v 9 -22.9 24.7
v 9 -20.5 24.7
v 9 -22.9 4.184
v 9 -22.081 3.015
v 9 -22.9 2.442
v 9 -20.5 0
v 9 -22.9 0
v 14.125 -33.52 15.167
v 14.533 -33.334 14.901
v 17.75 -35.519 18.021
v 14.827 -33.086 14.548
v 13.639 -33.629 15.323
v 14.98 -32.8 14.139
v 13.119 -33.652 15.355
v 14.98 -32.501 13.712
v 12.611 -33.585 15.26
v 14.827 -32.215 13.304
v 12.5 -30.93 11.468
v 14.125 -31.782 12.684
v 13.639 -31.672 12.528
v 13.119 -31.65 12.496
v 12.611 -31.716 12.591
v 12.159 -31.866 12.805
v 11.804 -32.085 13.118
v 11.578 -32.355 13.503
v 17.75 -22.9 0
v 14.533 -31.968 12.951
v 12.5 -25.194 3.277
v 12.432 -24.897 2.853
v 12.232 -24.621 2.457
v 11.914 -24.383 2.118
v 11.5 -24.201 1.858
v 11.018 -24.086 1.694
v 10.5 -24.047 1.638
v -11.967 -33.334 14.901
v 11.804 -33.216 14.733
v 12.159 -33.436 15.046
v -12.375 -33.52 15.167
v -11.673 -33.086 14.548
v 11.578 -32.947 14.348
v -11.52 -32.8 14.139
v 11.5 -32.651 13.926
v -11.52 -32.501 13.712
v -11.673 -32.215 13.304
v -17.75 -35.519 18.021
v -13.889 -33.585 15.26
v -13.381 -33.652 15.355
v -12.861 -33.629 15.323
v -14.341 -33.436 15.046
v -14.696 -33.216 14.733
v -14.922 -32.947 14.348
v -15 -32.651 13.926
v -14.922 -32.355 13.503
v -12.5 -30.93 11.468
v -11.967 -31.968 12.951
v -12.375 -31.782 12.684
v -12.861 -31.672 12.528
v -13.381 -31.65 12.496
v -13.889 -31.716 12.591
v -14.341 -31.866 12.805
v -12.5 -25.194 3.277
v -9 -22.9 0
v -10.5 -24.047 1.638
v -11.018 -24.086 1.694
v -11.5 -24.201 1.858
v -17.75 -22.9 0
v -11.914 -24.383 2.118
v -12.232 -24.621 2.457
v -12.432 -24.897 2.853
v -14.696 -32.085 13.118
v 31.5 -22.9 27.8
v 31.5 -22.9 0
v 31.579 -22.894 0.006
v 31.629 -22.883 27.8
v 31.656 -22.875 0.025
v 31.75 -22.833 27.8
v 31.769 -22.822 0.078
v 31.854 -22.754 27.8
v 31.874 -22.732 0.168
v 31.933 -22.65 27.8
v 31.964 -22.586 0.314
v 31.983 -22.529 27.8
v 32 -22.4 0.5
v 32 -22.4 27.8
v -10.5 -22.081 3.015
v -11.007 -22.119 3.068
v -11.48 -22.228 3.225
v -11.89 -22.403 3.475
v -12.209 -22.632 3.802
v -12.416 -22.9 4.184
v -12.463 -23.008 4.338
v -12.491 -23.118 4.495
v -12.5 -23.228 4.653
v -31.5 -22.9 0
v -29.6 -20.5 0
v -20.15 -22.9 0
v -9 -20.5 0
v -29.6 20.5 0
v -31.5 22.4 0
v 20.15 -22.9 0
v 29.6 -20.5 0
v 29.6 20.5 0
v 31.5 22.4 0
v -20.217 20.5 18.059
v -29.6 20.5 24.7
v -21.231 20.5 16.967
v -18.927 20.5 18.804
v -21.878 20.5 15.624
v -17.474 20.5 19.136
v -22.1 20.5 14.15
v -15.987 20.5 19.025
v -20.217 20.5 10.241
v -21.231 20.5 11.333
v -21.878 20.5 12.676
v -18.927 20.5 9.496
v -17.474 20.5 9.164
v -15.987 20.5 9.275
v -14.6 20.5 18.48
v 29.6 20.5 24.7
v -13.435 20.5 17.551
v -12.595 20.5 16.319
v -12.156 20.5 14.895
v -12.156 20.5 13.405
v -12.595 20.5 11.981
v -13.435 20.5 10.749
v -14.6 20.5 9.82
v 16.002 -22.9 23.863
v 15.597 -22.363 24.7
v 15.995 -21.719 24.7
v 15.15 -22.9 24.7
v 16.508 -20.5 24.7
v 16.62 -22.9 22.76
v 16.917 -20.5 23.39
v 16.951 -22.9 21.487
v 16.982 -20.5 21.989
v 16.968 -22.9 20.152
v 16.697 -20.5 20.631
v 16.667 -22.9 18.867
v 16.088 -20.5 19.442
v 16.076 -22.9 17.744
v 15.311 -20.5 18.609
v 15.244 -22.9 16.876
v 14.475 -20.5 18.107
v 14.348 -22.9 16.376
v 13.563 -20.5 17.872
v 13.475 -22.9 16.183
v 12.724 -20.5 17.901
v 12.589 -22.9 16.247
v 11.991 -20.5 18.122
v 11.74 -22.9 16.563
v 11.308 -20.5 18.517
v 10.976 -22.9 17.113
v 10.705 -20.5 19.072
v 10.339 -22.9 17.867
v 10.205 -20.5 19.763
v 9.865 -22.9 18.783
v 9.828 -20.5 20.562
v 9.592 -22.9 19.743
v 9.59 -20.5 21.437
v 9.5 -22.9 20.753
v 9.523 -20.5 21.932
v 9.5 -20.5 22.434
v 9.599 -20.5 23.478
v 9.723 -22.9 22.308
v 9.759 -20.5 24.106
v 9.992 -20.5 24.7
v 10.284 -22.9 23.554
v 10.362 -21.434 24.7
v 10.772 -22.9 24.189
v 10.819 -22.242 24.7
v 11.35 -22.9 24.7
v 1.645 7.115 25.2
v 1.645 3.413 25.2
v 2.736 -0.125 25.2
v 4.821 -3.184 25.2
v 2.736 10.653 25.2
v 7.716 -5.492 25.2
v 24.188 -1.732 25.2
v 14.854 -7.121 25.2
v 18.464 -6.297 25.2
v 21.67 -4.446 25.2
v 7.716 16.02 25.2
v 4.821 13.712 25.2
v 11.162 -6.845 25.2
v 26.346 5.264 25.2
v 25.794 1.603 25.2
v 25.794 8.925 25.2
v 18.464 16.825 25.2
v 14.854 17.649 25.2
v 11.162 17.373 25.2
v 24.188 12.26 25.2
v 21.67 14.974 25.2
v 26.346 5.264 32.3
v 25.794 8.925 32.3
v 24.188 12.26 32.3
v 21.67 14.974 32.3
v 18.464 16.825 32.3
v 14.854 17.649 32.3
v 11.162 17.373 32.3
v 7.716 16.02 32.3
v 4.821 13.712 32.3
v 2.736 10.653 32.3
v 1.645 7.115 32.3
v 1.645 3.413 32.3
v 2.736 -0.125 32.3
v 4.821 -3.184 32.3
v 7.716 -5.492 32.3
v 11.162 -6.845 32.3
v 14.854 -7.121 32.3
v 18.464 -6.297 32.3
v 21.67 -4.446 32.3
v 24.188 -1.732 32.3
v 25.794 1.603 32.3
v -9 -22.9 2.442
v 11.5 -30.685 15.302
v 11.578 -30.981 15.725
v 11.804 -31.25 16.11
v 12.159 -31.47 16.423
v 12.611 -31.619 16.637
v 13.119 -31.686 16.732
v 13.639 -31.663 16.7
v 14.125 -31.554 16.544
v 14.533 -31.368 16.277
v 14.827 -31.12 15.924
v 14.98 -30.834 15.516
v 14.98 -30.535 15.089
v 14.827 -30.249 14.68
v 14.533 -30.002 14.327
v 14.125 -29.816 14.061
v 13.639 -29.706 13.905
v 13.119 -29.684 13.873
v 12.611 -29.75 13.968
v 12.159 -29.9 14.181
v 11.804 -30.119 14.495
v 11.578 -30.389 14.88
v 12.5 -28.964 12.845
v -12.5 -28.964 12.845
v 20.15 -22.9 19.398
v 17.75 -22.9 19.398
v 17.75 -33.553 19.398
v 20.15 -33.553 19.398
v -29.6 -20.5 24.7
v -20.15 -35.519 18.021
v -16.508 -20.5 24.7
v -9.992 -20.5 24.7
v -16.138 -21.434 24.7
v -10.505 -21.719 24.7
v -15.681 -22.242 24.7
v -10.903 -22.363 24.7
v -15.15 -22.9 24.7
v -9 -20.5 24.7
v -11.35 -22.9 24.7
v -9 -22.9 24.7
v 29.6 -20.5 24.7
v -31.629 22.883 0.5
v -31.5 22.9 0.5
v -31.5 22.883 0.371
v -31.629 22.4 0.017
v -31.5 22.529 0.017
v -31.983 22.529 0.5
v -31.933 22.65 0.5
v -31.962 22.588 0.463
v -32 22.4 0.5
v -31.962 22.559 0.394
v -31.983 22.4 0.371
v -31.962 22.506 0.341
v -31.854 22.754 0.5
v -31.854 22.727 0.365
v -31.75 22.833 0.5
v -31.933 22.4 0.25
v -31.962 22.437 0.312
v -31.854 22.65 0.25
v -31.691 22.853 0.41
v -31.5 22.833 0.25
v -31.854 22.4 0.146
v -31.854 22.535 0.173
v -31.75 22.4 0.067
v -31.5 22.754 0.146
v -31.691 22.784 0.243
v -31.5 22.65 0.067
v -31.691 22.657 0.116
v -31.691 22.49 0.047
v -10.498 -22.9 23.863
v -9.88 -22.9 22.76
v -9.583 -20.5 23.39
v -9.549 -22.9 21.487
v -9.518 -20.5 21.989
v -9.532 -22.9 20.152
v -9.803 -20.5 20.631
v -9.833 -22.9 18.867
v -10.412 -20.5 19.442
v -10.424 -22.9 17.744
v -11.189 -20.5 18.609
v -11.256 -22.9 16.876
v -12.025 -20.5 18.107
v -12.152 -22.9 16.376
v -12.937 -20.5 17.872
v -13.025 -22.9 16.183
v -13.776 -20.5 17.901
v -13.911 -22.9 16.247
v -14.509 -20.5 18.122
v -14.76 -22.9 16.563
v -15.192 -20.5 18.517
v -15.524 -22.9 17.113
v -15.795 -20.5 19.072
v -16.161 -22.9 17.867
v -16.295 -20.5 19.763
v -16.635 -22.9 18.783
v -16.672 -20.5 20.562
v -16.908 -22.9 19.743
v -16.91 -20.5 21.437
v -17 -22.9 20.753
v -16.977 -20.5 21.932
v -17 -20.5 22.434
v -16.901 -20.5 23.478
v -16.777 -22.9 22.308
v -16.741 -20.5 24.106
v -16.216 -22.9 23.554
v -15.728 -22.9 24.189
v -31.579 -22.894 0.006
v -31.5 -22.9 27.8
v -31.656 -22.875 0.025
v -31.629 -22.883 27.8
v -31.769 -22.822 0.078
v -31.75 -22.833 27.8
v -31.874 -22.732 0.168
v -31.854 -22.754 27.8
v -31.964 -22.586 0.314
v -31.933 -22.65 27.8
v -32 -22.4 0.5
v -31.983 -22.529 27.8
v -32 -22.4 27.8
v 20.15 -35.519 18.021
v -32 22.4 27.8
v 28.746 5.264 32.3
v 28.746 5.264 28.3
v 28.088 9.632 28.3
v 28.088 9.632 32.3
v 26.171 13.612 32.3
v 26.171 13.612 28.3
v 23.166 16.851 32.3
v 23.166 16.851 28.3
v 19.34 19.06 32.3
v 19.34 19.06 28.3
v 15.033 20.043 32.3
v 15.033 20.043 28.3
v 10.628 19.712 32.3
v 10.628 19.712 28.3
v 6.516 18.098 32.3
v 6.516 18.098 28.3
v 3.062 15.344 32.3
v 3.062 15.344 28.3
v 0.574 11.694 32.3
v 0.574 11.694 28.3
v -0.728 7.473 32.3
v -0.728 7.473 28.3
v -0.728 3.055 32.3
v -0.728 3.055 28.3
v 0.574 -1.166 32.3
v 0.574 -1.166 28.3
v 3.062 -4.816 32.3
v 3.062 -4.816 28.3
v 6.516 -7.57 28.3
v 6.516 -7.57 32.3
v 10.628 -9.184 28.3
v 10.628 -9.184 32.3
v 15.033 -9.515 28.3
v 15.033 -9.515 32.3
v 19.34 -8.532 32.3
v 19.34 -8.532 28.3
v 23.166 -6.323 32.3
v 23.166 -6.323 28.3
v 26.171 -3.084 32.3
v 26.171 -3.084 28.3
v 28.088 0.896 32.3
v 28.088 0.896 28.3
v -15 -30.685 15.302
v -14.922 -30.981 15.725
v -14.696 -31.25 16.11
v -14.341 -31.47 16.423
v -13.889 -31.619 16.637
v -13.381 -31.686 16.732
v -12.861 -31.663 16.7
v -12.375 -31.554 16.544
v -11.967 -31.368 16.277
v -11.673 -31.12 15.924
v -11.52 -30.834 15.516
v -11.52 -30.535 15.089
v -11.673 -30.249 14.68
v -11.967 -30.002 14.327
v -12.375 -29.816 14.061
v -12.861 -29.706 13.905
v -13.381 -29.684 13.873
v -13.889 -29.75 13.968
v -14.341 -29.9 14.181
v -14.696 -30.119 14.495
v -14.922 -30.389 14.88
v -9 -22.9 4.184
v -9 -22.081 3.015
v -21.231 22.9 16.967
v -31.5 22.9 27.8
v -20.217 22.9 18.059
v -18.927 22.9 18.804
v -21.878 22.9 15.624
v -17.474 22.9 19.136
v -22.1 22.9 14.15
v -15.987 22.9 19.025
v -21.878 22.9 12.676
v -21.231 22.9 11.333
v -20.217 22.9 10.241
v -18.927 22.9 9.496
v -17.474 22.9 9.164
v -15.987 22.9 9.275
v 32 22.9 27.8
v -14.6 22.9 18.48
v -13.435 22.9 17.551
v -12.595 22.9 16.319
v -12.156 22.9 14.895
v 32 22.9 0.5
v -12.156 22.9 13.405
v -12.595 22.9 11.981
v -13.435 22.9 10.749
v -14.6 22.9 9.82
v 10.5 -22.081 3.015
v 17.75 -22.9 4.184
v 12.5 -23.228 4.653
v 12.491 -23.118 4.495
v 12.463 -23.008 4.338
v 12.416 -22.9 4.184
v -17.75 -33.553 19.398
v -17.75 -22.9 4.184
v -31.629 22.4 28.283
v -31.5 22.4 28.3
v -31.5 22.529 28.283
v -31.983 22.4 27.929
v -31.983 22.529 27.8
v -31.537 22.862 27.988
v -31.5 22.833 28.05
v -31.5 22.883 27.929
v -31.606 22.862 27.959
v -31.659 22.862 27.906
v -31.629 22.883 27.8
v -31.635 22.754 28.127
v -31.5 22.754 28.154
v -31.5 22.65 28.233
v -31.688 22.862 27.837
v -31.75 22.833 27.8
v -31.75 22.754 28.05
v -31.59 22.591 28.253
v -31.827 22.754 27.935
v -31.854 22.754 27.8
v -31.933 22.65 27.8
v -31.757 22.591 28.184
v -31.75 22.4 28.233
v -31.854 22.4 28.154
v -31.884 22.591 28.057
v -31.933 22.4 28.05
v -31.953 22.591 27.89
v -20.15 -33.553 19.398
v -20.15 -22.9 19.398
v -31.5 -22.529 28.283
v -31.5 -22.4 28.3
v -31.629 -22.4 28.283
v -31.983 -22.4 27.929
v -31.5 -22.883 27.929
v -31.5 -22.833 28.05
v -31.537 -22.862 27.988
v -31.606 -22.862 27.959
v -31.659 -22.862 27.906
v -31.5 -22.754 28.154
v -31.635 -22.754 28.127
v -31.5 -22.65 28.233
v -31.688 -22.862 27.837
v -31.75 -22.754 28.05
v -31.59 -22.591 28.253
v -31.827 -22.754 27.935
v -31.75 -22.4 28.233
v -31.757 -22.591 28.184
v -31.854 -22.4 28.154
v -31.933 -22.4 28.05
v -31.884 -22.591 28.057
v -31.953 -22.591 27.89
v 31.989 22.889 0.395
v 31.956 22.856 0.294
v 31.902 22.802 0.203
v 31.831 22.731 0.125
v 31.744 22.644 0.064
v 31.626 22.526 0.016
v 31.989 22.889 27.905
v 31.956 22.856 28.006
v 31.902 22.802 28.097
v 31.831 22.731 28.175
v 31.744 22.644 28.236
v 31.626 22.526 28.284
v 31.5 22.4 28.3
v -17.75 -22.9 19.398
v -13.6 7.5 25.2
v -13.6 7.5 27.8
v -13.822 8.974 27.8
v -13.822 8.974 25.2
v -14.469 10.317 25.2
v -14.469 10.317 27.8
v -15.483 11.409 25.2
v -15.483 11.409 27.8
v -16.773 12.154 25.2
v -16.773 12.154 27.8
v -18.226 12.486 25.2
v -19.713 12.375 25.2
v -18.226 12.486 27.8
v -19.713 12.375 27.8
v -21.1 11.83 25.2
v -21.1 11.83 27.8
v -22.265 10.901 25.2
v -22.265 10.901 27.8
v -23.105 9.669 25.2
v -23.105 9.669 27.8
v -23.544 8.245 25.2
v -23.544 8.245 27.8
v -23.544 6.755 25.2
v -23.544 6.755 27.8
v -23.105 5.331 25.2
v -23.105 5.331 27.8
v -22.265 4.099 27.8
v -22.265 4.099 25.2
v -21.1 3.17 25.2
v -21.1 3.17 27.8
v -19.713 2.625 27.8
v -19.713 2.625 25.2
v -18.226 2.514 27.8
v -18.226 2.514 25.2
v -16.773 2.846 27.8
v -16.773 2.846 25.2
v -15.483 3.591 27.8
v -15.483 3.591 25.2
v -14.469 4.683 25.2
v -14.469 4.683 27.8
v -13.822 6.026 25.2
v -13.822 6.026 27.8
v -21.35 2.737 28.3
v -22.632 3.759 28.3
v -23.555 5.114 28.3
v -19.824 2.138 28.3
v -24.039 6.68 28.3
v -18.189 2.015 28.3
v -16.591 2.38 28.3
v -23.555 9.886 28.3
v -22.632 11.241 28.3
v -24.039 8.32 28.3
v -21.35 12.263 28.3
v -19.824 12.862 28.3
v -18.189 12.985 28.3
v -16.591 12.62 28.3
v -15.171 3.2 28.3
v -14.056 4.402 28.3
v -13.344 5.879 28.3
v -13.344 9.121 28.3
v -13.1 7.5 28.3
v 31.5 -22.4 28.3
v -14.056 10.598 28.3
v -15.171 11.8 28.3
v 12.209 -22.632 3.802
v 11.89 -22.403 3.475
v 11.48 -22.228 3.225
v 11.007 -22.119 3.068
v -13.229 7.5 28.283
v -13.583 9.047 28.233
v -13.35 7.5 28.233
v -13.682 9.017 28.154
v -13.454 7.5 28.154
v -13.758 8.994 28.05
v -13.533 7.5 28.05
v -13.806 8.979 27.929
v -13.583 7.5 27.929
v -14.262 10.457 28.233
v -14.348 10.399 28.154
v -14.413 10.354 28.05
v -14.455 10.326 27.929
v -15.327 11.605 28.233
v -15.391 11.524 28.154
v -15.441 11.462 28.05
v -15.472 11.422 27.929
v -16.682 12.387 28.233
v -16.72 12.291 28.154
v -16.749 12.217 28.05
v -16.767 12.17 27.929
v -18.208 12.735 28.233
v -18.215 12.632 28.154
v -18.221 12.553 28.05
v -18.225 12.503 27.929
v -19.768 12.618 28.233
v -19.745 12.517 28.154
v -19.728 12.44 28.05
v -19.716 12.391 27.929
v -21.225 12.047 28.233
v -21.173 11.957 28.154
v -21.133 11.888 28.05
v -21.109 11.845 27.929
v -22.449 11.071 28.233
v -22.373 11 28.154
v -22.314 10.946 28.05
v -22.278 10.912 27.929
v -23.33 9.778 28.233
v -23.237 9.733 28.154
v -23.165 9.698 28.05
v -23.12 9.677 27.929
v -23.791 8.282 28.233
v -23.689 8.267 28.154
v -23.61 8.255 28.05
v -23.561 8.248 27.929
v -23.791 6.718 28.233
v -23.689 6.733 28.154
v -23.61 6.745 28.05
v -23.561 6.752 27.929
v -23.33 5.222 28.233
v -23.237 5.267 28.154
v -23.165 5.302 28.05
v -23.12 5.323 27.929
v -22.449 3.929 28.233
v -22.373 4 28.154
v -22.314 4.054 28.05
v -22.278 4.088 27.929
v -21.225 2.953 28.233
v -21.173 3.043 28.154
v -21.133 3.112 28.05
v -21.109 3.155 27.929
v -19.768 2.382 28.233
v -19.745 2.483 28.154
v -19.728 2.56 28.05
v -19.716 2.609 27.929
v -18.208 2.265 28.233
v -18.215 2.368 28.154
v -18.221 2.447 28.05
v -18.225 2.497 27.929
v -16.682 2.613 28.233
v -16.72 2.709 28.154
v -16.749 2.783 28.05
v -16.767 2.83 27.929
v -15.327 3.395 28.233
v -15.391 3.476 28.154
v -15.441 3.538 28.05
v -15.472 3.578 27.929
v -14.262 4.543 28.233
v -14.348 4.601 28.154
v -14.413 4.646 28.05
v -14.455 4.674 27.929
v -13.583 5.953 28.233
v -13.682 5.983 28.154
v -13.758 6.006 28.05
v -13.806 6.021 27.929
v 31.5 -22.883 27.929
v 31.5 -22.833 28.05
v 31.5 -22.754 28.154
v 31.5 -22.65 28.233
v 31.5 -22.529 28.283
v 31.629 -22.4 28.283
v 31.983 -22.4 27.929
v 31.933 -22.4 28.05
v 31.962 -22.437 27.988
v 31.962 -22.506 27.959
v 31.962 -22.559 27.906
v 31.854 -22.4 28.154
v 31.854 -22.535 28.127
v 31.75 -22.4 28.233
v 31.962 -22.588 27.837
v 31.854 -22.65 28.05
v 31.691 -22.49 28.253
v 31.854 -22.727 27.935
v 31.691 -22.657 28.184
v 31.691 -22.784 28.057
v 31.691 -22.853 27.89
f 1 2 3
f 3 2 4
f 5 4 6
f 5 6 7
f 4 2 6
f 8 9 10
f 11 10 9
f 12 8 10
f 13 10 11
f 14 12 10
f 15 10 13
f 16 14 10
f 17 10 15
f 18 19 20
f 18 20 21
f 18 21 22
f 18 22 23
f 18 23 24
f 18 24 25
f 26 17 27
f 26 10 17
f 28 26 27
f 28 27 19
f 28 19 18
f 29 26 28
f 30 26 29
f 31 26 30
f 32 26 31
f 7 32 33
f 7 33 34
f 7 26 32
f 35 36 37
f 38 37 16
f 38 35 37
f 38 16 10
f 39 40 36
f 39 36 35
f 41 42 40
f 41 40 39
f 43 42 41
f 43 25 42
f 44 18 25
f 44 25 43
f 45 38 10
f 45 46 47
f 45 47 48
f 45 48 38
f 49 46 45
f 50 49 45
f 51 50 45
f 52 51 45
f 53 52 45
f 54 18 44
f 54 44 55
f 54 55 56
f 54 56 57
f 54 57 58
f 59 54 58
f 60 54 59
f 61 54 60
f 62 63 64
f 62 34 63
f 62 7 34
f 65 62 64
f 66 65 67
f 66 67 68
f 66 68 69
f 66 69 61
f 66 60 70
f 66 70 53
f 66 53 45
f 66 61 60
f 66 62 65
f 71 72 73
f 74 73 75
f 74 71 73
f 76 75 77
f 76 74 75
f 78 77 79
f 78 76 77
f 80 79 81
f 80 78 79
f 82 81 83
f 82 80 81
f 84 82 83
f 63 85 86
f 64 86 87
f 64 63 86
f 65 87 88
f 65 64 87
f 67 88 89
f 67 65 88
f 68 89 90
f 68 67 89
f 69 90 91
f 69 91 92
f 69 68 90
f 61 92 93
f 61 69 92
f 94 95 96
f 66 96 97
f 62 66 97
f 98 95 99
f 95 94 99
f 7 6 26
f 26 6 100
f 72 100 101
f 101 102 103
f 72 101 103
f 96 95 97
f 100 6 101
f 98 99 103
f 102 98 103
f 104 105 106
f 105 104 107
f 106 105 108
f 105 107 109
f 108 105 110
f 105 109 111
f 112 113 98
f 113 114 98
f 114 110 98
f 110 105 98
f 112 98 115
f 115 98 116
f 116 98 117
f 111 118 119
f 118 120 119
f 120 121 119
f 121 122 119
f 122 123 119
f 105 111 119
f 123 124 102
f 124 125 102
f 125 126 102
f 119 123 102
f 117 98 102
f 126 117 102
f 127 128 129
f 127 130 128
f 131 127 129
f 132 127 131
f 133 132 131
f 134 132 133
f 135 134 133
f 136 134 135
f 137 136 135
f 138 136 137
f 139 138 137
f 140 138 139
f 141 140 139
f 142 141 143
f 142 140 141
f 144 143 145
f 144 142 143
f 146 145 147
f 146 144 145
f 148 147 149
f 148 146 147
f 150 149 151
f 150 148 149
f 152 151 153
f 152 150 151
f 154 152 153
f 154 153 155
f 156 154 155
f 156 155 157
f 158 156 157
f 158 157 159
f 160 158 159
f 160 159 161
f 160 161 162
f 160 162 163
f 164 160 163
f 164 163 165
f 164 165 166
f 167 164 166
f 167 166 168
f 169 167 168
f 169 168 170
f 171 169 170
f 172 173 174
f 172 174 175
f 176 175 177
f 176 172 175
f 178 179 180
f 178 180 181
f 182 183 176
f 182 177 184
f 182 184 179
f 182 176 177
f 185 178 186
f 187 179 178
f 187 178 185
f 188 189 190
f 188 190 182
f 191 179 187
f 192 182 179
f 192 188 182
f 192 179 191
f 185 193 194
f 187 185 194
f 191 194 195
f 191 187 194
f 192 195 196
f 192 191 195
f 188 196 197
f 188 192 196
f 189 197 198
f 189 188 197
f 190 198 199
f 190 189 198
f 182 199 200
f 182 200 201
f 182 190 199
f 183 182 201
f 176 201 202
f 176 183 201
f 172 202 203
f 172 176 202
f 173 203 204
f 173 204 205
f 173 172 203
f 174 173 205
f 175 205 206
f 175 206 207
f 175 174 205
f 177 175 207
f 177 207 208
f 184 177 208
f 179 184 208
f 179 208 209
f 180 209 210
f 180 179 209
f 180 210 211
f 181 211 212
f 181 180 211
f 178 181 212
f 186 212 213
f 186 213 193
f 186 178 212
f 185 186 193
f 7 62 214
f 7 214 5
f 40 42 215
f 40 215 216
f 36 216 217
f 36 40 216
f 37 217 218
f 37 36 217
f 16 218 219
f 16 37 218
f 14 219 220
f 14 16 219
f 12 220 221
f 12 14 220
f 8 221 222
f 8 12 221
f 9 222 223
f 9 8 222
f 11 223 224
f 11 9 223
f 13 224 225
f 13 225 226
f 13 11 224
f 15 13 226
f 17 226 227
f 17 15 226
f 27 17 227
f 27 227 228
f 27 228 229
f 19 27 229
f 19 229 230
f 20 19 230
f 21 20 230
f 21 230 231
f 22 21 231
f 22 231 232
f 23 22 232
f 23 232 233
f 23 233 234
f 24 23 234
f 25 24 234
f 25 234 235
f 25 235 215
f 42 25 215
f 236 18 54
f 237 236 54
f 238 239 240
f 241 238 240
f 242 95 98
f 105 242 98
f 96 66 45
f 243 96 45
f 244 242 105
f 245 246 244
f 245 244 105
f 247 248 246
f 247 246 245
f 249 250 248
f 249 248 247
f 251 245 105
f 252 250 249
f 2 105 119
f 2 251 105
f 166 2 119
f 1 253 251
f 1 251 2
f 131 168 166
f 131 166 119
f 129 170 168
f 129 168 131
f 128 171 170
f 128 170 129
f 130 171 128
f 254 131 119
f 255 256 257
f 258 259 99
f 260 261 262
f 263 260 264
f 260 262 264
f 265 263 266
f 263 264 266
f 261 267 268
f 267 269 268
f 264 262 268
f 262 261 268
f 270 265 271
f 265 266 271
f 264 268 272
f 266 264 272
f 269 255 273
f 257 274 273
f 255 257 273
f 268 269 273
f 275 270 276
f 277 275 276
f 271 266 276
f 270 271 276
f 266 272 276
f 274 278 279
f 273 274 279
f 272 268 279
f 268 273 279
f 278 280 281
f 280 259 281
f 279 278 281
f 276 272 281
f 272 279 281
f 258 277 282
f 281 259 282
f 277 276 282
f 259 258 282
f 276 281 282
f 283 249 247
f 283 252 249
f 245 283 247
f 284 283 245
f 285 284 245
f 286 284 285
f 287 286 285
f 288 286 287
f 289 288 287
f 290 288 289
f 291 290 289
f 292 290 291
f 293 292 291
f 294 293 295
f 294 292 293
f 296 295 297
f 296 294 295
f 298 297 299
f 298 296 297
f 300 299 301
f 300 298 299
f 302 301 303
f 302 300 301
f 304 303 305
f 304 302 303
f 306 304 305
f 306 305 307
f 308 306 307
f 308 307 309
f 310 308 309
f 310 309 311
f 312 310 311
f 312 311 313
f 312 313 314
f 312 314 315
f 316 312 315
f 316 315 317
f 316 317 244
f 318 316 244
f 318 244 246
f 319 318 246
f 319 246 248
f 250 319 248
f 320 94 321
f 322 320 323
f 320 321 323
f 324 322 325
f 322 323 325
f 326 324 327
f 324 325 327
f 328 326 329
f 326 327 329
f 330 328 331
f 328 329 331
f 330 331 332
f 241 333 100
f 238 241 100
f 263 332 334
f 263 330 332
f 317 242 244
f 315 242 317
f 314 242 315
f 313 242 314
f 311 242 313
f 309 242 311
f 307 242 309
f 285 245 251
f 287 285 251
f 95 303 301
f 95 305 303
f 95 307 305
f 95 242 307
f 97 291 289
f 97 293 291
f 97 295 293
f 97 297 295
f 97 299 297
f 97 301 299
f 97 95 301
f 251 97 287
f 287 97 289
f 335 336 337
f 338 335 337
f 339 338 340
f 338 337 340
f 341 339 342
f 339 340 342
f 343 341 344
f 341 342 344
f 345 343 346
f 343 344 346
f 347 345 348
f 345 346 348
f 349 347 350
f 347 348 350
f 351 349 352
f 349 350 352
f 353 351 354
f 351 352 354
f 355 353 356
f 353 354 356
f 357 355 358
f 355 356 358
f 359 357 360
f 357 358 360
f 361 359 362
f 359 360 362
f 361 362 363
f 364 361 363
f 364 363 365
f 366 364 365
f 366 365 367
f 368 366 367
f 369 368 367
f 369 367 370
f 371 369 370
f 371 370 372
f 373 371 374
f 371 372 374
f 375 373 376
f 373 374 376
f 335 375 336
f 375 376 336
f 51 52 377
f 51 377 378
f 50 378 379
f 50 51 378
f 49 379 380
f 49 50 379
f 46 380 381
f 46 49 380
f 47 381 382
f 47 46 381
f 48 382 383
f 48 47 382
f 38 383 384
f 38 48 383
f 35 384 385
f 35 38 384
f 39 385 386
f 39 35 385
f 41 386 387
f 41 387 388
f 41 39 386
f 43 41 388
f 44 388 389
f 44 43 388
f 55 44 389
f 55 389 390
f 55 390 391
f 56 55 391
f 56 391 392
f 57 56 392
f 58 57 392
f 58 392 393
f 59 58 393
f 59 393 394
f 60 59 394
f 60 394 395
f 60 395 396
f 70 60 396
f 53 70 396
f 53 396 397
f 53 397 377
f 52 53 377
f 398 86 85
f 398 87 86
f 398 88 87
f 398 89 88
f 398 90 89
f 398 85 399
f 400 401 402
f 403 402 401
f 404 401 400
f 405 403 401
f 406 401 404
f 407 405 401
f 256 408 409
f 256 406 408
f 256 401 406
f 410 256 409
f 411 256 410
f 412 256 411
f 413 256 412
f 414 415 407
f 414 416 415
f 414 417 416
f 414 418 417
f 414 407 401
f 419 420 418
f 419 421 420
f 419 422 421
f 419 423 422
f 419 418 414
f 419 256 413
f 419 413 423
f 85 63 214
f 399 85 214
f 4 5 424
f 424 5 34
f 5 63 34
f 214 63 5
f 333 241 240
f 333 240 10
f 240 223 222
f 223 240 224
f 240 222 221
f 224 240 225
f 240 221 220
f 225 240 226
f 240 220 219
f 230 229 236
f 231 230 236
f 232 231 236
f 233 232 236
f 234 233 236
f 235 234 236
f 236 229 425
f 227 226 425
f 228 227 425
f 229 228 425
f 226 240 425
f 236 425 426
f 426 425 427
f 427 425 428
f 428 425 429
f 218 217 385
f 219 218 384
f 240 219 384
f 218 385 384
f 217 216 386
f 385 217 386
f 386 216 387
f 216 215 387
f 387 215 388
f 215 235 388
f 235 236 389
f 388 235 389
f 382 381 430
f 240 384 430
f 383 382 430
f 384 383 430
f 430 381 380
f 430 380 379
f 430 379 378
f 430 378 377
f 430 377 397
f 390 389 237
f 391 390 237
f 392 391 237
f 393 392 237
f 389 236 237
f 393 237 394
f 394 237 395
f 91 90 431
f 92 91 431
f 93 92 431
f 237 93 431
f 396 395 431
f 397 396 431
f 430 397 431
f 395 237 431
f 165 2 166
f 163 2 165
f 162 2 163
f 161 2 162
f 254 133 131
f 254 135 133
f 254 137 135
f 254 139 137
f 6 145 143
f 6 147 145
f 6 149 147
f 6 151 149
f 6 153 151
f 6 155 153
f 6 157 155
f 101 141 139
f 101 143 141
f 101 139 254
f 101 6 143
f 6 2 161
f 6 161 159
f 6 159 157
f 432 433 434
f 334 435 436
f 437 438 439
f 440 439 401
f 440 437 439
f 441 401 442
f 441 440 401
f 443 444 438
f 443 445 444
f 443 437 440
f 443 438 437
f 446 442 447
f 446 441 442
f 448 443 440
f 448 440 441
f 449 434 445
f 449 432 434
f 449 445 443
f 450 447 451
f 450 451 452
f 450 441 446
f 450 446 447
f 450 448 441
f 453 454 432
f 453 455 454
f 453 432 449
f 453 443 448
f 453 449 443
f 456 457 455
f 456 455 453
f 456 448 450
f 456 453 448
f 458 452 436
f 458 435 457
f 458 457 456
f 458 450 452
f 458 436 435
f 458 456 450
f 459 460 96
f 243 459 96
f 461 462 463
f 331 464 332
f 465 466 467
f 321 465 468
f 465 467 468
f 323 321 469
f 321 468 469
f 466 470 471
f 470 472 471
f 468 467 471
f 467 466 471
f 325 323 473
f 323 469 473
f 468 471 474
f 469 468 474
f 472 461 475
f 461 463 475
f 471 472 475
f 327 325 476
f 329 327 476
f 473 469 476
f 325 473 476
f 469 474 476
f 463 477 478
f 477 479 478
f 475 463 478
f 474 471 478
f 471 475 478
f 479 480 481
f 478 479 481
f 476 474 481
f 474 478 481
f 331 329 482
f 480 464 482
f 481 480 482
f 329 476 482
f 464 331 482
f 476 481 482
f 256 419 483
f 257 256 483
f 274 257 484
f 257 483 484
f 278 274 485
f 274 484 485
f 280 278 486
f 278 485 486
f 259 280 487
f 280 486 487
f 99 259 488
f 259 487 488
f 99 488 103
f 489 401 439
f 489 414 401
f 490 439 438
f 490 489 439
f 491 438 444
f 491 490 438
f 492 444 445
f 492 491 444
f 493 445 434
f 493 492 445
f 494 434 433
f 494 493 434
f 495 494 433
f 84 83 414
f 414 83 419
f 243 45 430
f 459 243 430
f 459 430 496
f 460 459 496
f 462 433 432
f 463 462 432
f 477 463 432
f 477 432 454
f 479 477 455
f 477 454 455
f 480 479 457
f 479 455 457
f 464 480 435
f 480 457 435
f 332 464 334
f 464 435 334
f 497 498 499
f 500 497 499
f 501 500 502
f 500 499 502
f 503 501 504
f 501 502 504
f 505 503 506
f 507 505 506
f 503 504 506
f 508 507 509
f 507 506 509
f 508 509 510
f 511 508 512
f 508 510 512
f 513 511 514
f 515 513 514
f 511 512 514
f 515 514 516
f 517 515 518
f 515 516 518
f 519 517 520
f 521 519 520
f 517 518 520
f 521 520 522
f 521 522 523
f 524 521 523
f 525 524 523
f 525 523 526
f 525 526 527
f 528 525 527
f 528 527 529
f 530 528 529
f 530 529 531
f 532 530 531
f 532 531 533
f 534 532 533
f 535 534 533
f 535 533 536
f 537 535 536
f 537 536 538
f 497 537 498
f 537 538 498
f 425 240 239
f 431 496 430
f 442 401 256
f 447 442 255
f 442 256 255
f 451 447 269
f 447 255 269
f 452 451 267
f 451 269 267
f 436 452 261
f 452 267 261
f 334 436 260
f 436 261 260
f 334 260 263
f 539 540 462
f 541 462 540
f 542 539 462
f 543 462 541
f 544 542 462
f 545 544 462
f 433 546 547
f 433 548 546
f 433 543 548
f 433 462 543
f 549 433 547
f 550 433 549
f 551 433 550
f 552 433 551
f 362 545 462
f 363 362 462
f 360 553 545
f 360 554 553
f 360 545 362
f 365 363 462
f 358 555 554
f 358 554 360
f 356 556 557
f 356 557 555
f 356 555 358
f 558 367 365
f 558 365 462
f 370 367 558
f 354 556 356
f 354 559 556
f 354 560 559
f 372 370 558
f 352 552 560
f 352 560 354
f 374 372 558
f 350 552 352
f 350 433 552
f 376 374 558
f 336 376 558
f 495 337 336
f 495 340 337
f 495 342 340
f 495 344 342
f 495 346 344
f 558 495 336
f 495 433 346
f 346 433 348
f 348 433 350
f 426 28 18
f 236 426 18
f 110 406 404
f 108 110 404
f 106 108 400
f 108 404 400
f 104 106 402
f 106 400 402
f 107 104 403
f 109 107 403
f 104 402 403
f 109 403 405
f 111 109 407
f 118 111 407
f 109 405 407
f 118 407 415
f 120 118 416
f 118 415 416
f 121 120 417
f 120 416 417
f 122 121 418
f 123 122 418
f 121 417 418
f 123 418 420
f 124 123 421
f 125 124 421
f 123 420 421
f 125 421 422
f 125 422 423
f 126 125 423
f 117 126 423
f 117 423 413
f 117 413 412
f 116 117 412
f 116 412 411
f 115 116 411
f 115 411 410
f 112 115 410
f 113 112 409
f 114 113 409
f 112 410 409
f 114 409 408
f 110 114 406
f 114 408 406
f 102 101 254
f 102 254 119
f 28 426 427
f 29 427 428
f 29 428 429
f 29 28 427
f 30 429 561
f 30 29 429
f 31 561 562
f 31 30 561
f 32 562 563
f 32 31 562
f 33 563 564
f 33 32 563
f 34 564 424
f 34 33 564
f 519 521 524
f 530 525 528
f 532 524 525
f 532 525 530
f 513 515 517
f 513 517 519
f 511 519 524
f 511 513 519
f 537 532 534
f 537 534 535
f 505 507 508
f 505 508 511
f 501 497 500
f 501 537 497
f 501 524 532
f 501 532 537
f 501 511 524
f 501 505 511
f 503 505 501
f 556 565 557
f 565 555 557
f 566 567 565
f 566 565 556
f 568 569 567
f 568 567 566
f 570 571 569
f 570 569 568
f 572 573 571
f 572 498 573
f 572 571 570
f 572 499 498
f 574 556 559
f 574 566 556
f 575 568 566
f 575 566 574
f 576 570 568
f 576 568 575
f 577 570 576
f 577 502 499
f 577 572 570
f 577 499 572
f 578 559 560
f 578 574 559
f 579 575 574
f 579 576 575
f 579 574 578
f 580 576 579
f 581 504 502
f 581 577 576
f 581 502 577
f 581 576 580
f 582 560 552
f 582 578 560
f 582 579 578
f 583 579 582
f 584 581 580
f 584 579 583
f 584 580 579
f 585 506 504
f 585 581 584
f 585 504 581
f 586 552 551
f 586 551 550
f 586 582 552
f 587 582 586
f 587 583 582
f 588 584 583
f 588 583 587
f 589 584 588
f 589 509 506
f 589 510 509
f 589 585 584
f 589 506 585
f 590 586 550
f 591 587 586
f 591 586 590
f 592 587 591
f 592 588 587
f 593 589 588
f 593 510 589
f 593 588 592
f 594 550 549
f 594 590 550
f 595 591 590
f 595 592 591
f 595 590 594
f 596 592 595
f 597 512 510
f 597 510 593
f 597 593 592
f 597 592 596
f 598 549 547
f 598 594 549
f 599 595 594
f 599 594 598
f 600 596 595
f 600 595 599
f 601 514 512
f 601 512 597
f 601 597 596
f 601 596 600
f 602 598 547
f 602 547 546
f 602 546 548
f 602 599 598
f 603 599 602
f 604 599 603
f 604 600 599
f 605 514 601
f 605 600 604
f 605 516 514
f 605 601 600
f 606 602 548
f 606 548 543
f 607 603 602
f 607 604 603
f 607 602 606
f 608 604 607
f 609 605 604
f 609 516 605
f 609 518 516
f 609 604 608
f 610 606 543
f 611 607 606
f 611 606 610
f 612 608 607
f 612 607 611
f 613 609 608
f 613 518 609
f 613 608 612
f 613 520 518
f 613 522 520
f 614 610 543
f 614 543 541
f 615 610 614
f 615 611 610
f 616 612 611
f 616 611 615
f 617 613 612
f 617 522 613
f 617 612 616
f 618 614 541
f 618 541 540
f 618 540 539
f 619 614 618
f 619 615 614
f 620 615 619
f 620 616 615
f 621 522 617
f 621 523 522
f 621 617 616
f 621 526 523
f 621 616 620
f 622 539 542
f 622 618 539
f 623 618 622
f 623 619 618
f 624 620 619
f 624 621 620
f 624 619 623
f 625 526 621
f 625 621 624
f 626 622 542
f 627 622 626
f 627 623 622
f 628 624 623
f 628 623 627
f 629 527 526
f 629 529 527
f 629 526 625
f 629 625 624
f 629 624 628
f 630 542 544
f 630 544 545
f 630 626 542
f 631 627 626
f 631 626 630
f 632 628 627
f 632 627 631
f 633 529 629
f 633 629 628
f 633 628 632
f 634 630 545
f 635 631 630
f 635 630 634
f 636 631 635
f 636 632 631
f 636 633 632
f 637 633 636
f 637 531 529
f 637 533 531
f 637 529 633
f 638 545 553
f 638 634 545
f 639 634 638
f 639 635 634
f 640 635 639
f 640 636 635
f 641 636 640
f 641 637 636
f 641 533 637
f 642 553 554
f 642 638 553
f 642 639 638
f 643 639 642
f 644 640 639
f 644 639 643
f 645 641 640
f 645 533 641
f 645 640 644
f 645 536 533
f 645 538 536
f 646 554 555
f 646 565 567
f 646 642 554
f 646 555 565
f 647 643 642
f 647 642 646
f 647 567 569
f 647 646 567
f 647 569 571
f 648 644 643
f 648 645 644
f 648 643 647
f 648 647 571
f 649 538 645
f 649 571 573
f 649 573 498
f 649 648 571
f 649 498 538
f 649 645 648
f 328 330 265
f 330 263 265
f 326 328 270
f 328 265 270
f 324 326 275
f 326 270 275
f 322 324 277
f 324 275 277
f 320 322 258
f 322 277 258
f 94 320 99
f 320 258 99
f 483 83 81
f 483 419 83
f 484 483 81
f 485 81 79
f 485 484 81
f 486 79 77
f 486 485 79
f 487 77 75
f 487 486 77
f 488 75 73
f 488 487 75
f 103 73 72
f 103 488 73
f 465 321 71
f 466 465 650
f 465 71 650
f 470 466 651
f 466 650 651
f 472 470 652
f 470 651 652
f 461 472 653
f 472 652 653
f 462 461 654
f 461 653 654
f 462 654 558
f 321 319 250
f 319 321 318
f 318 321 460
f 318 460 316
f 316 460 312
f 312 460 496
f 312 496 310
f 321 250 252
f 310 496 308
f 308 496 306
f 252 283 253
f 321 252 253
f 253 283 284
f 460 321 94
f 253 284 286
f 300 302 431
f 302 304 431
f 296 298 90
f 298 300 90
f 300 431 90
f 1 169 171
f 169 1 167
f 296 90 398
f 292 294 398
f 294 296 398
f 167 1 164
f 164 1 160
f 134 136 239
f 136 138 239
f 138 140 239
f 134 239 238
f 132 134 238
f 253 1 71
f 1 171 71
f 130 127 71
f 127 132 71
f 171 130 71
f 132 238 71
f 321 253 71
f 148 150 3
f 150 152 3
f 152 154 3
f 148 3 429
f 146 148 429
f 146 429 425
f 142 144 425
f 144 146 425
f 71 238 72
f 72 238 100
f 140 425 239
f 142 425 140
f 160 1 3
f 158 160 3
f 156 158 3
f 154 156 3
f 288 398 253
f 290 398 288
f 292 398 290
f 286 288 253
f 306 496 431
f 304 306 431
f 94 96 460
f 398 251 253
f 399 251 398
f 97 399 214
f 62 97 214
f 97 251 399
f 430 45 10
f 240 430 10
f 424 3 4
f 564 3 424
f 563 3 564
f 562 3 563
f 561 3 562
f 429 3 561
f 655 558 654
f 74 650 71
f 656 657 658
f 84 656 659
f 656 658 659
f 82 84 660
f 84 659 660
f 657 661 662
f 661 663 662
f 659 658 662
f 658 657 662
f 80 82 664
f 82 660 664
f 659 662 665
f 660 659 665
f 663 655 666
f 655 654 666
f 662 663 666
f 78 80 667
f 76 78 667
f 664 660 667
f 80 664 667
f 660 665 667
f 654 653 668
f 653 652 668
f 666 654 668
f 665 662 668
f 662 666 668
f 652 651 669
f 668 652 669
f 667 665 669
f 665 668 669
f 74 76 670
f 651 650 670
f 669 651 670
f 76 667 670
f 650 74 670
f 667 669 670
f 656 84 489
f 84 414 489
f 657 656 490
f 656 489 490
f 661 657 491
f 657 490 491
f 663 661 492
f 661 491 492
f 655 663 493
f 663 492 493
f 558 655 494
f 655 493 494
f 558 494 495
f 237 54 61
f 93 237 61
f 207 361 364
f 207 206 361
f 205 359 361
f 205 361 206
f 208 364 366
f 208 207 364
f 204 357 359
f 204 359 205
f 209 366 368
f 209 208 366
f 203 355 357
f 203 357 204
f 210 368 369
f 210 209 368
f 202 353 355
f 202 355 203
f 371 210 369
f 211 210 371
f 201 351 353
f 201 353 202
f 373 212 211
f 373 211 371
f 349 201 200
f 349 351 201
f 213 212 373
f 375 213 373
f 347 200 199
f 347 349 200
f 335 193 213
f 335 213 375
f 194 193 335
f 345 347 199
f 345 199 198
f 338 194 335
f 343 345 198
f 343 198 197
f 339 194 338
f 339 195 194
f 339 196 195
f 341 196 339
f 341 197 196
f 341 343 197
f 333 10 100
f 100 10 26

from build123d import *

# Parameters (mm, degrees)
F5_W         = 64
F5_H         = 45.8
F5_W_2       = 59.2
F5_H_2       = 41
F6_DEPTH     = 24.7
F7_W         = 64
F7_H         = 45.8
F7_W_2       = 59.2
F7_H_2       = 41
F8_DEPTH     = 3.6
F9_R         = 5
F10_DEPTH    = 3.1
F11_R        = 14.82
F11_R_2      = 12.42
F12_DEPTH    = 4
F13_DEPTH    = 3.1
F14_R        = 5
F15_DEPTH    = 2.4
F17_R        = 1.75
F18_DEPTH    = 2.4
F20_DEPTH    = 2.4
F22_DEPTH    = 2.4
F23_R        = 1.75
F24_REACH    = 60.9944299909
F25_R        = 0.5
F26_W        = 18
F26_H        = 2.4
F27_DEPTH    = 24.7
F28_R        = 3.75
F29_REACH    = 64.2512842404
F31_DEPTH    = 2.4
F32_T1_DEPTH = 2.4


# Not quite as in the source:
# - a fillet or chamfer that OpenCascade refuses, or shapes differently, is made with other operations: its cross-section is extruded or revolved along the edge and cut away or added
# - a feature names something its author has since deleted; it is built from what else it names


with BuildPart() as f6:
    # F5 (on Top) → F6 (new body)
    with BuildSketch(Plane.XY):
        Rectangle(F5_W, F5_H)
        Rectangle(F5_W_2, F5_H_2, mode=Mode.SUBTRACT)
    extrude(amount=F6_DEPTH)

    # F7 (on face) → F8 (join)
    with BuildSketch(Plane.XY.offset(24.7)):
        Rectangle(F7_W, F7_H)
        Rectangle(F7_W_2, F7_H_2, mode=Mode.SUBTRACT)
        Rectangle(F7_W_2, F7_H_2)
    extrude(amount=F8_DEPTH)

    # F9 (on face) → F10 (cut)
    with BuildSketch(Plane.XY.offset(28.3)):
        with Locations((-18.6, 7.5)):
            Circle(F9_R)
    extrude(amount=-F10_DEPTH, mode=Mode.SUBTRACT)

    # F11 (on face) → F12 (join)
    with BuildSketch(Plane.XY.offset(28.3)):
        with Locations((13.926, 5.264)):
            Circle(F11_R)
        with Locations((13.926, 5.264)):
            Circle(F11_R_2, mode=Mode.SUBTRACT)
    extrude(amount=F12_DEPTH)

    # F13 (cut): a face of the model
    f13_faces = [f6.faces().sort_by_distance(p)[0] for p in [
        (13.926, 5.264, 28.3),
    ]]
    extrude(f13_faces, amount=-F13_DEPTH, mode=Mode.SUBTRACT)

    # F14 (on face) → F15 (cut)
    with BuildSketch(Plane(origin=(0, 22.9, 0), x_dir=(-1, 0, 0), z_dir=(0, 1, 0))):
        with Locations((17.1, 14.15)):
            Circle(F14_R)
    extrude(amount=-F15_DEPTH, mode=Mode.SUBTRACT)

    # F17 (on face) → F18 (join)
    with BuildSketch(Plane(origin=(0, -15.3661306411, -10.759480508), x_dir=(-1, 0, 0), z_dir=(0, 0.8191520443, 0.5735764364))):
        Polygon((0, 24.1349003924), (0, 13.1349003924), (17.75, 13.1349003924), (17.75, 35.1349003924), (0, 35.1349003924), align=None)
        with Locations((13.25, 30.1349003924)):
            Circle(F17_R, mode=Mode.SUBTRACT)
        Polygon((-17.75, 13.1349003924), (0, 13.1349003924), (0, 24.1349003924), (0, 35.1349003924), (-17.75, 35.1349003924), align=None)
        with Locations((-13.25, 30.1349003924)):
            Circle(F17_R, mode=Mode.SUBTRACT)
    extrude(amount=F18_DEPTH)

    # F19 (on face) → F20 (join)
    with BuildSketch(Plane(origin=(-17.75, 0, 0), x_dir=(0, -1, 0), z_dir=(-1, 0, 0))):
        Polygon((22.9, 0), (35.5186815997, 18.0213449744), (33.5527166934, 19.3979284216), (22.9, 19.3979284216), align=None)
    extrude(amount=F20_DEPTH)

    # F21 (on face) → F22 (join)
    with BuildSketch(Plane.YZ.offset(17.75)):
        Polygon((-35.5186815997, 18.0213449744), (-22.9, 0), (-22.9, 19.3979284216), (-33.5527166934, 19.3979284216), align=None)
    extrude(amount=F22_DEPTH)

    f24_end = f6.faces().sort_by_distance((0, 0, 24.7))[0]
    # F23 (on face) → F24 (cut, up to a face of the model that its end follows)
    with BuildSketch(Plane(origin=(0, -15.3661306411, -10.759480508), x_dir=(1, 0, 0), z_dir=(0, -0.8191520443, -0.5735764364))):
        with Locations((-13.25, 30.1349003924)):
            Circle(F23_R)
        with Locations((13.25, 30.1349003924)):
            Circle(F23_R)
    f24_long = extrude(amount=-F24_REACH, mode=Mode.PRIVATE)
    add(split(f24_long, bisect_by=f24_end, keep=Keep.TOP, mode=Mode.PRIVATE), mode=Mode.SUBTRACT)

    # F25
    f25_edges = [f6.edges().sort_by_distance(p)[0] for p in [
        (-32, 0, 28.3),
        (0, -22.9, 28.3),
        (32, 0, 28.3),
        (0, 22.9, 28.3),
        (-23.6, 7.5, 28.3),
        (32, 0, 0),
        (0, 22.9, 0),
        (-32, 22.9, 14.15),
        (-32, 0, 0),
        (-32, -22.9, 14.15),
        (32, -22.9, 14.15),
    ]]
    fillet(f25_edges, radius=F25_R)

    # F26 (on face) → F27 (cut, through all)
    with BuildSketch(Plane(origin=(0, 0, 0), x_dir=(1, 0, 0), z_dir=(0, 0, -1))):
        with Locations((0, 21.7)):
            Rectangle(F26_W, F26_H)
    extrude(amount=-F27_DEPTH, mode=Mode.SUBTRACT)

    f29_end = Plane(origin=(0, -0.3794689119, 24.7), x_dir=(-1, 0, 0), z_dir=(0, 0, -1))
    # F28 (on face) → F29 (cut, up to a plane its end follows)
    with BuildSketch(Plane(origin=(0, -13.4001657348, -9.3828970608), x_dir=(-1, 0, 0), z_dir=(0, 0.8191520443, 0.5735764364))):
        with Locations((13.25, 30.1349003924)):
            Circle(F28_R)
        with Locations((-13.25, 30.1349003924)):
            Circle(F28_R)
    f29_long = extrude(amount=F29_REACH, mode=Mode.PRIVATE)
    add(split(f29_long, bisect_by=f29_end, keep=Keep.TOP, mode=Mode.PRIVATE), mode=Mode.SUBTRACT)

    # F30 (on face) → F31 (cut)
    with BuildSketch(Plane(origin=(0, -15.3661306411, -10.759480508), x_dir=(1, 0, 0), z_dir=(0, -0.8191520443, -0.5735764364))):
        Polygon((-12.5, 27.1349003924), (-12.5, 15.1349003924), (0, 15.1349003924), (12.5, 15.1349003924), (12.5, 27.1349003924), align=None)
    extrude(amount=-F31_DEPTH, mode=Mode.SUBTRACT)

    # F32: fillet of radius 2 on 2 edges, made by hand

    # F32_s2 → F32_t1 (join)
    with BuildSketch(Plane(origin=(0, -15.3661306411, -10.759480508), x_dir=(1, 0, 0), z_dir=(0, 0.8191520443, 0.5735764364))):
        with BuildLine():
            ThreePointArc((-10.5, -15.1349003924), (-11.9142135624, -15.7206868301), (-12.5, -17.1349003924))
            Line((-12.5, -17.1349003924), (-12.5, -15.1349003924))
            Line((-12.5, -15.1349003924), (-10.5, -15.1349003924))
        make_face()
        with BuildLine():
            ThreePointArc((12.5, -17.1349003924), (11.9142135624, -15.7206868301), (10.5, -15.1349003924))
            Line((10.5, -15.1349003924), (12.5, -15.1349003924))
            Line((12.5, -15.1349003924), (12.5, -17.1349003924))
        make_face()
    extrude(amount=F32_T1_DEPTH)


solid = f6.part
